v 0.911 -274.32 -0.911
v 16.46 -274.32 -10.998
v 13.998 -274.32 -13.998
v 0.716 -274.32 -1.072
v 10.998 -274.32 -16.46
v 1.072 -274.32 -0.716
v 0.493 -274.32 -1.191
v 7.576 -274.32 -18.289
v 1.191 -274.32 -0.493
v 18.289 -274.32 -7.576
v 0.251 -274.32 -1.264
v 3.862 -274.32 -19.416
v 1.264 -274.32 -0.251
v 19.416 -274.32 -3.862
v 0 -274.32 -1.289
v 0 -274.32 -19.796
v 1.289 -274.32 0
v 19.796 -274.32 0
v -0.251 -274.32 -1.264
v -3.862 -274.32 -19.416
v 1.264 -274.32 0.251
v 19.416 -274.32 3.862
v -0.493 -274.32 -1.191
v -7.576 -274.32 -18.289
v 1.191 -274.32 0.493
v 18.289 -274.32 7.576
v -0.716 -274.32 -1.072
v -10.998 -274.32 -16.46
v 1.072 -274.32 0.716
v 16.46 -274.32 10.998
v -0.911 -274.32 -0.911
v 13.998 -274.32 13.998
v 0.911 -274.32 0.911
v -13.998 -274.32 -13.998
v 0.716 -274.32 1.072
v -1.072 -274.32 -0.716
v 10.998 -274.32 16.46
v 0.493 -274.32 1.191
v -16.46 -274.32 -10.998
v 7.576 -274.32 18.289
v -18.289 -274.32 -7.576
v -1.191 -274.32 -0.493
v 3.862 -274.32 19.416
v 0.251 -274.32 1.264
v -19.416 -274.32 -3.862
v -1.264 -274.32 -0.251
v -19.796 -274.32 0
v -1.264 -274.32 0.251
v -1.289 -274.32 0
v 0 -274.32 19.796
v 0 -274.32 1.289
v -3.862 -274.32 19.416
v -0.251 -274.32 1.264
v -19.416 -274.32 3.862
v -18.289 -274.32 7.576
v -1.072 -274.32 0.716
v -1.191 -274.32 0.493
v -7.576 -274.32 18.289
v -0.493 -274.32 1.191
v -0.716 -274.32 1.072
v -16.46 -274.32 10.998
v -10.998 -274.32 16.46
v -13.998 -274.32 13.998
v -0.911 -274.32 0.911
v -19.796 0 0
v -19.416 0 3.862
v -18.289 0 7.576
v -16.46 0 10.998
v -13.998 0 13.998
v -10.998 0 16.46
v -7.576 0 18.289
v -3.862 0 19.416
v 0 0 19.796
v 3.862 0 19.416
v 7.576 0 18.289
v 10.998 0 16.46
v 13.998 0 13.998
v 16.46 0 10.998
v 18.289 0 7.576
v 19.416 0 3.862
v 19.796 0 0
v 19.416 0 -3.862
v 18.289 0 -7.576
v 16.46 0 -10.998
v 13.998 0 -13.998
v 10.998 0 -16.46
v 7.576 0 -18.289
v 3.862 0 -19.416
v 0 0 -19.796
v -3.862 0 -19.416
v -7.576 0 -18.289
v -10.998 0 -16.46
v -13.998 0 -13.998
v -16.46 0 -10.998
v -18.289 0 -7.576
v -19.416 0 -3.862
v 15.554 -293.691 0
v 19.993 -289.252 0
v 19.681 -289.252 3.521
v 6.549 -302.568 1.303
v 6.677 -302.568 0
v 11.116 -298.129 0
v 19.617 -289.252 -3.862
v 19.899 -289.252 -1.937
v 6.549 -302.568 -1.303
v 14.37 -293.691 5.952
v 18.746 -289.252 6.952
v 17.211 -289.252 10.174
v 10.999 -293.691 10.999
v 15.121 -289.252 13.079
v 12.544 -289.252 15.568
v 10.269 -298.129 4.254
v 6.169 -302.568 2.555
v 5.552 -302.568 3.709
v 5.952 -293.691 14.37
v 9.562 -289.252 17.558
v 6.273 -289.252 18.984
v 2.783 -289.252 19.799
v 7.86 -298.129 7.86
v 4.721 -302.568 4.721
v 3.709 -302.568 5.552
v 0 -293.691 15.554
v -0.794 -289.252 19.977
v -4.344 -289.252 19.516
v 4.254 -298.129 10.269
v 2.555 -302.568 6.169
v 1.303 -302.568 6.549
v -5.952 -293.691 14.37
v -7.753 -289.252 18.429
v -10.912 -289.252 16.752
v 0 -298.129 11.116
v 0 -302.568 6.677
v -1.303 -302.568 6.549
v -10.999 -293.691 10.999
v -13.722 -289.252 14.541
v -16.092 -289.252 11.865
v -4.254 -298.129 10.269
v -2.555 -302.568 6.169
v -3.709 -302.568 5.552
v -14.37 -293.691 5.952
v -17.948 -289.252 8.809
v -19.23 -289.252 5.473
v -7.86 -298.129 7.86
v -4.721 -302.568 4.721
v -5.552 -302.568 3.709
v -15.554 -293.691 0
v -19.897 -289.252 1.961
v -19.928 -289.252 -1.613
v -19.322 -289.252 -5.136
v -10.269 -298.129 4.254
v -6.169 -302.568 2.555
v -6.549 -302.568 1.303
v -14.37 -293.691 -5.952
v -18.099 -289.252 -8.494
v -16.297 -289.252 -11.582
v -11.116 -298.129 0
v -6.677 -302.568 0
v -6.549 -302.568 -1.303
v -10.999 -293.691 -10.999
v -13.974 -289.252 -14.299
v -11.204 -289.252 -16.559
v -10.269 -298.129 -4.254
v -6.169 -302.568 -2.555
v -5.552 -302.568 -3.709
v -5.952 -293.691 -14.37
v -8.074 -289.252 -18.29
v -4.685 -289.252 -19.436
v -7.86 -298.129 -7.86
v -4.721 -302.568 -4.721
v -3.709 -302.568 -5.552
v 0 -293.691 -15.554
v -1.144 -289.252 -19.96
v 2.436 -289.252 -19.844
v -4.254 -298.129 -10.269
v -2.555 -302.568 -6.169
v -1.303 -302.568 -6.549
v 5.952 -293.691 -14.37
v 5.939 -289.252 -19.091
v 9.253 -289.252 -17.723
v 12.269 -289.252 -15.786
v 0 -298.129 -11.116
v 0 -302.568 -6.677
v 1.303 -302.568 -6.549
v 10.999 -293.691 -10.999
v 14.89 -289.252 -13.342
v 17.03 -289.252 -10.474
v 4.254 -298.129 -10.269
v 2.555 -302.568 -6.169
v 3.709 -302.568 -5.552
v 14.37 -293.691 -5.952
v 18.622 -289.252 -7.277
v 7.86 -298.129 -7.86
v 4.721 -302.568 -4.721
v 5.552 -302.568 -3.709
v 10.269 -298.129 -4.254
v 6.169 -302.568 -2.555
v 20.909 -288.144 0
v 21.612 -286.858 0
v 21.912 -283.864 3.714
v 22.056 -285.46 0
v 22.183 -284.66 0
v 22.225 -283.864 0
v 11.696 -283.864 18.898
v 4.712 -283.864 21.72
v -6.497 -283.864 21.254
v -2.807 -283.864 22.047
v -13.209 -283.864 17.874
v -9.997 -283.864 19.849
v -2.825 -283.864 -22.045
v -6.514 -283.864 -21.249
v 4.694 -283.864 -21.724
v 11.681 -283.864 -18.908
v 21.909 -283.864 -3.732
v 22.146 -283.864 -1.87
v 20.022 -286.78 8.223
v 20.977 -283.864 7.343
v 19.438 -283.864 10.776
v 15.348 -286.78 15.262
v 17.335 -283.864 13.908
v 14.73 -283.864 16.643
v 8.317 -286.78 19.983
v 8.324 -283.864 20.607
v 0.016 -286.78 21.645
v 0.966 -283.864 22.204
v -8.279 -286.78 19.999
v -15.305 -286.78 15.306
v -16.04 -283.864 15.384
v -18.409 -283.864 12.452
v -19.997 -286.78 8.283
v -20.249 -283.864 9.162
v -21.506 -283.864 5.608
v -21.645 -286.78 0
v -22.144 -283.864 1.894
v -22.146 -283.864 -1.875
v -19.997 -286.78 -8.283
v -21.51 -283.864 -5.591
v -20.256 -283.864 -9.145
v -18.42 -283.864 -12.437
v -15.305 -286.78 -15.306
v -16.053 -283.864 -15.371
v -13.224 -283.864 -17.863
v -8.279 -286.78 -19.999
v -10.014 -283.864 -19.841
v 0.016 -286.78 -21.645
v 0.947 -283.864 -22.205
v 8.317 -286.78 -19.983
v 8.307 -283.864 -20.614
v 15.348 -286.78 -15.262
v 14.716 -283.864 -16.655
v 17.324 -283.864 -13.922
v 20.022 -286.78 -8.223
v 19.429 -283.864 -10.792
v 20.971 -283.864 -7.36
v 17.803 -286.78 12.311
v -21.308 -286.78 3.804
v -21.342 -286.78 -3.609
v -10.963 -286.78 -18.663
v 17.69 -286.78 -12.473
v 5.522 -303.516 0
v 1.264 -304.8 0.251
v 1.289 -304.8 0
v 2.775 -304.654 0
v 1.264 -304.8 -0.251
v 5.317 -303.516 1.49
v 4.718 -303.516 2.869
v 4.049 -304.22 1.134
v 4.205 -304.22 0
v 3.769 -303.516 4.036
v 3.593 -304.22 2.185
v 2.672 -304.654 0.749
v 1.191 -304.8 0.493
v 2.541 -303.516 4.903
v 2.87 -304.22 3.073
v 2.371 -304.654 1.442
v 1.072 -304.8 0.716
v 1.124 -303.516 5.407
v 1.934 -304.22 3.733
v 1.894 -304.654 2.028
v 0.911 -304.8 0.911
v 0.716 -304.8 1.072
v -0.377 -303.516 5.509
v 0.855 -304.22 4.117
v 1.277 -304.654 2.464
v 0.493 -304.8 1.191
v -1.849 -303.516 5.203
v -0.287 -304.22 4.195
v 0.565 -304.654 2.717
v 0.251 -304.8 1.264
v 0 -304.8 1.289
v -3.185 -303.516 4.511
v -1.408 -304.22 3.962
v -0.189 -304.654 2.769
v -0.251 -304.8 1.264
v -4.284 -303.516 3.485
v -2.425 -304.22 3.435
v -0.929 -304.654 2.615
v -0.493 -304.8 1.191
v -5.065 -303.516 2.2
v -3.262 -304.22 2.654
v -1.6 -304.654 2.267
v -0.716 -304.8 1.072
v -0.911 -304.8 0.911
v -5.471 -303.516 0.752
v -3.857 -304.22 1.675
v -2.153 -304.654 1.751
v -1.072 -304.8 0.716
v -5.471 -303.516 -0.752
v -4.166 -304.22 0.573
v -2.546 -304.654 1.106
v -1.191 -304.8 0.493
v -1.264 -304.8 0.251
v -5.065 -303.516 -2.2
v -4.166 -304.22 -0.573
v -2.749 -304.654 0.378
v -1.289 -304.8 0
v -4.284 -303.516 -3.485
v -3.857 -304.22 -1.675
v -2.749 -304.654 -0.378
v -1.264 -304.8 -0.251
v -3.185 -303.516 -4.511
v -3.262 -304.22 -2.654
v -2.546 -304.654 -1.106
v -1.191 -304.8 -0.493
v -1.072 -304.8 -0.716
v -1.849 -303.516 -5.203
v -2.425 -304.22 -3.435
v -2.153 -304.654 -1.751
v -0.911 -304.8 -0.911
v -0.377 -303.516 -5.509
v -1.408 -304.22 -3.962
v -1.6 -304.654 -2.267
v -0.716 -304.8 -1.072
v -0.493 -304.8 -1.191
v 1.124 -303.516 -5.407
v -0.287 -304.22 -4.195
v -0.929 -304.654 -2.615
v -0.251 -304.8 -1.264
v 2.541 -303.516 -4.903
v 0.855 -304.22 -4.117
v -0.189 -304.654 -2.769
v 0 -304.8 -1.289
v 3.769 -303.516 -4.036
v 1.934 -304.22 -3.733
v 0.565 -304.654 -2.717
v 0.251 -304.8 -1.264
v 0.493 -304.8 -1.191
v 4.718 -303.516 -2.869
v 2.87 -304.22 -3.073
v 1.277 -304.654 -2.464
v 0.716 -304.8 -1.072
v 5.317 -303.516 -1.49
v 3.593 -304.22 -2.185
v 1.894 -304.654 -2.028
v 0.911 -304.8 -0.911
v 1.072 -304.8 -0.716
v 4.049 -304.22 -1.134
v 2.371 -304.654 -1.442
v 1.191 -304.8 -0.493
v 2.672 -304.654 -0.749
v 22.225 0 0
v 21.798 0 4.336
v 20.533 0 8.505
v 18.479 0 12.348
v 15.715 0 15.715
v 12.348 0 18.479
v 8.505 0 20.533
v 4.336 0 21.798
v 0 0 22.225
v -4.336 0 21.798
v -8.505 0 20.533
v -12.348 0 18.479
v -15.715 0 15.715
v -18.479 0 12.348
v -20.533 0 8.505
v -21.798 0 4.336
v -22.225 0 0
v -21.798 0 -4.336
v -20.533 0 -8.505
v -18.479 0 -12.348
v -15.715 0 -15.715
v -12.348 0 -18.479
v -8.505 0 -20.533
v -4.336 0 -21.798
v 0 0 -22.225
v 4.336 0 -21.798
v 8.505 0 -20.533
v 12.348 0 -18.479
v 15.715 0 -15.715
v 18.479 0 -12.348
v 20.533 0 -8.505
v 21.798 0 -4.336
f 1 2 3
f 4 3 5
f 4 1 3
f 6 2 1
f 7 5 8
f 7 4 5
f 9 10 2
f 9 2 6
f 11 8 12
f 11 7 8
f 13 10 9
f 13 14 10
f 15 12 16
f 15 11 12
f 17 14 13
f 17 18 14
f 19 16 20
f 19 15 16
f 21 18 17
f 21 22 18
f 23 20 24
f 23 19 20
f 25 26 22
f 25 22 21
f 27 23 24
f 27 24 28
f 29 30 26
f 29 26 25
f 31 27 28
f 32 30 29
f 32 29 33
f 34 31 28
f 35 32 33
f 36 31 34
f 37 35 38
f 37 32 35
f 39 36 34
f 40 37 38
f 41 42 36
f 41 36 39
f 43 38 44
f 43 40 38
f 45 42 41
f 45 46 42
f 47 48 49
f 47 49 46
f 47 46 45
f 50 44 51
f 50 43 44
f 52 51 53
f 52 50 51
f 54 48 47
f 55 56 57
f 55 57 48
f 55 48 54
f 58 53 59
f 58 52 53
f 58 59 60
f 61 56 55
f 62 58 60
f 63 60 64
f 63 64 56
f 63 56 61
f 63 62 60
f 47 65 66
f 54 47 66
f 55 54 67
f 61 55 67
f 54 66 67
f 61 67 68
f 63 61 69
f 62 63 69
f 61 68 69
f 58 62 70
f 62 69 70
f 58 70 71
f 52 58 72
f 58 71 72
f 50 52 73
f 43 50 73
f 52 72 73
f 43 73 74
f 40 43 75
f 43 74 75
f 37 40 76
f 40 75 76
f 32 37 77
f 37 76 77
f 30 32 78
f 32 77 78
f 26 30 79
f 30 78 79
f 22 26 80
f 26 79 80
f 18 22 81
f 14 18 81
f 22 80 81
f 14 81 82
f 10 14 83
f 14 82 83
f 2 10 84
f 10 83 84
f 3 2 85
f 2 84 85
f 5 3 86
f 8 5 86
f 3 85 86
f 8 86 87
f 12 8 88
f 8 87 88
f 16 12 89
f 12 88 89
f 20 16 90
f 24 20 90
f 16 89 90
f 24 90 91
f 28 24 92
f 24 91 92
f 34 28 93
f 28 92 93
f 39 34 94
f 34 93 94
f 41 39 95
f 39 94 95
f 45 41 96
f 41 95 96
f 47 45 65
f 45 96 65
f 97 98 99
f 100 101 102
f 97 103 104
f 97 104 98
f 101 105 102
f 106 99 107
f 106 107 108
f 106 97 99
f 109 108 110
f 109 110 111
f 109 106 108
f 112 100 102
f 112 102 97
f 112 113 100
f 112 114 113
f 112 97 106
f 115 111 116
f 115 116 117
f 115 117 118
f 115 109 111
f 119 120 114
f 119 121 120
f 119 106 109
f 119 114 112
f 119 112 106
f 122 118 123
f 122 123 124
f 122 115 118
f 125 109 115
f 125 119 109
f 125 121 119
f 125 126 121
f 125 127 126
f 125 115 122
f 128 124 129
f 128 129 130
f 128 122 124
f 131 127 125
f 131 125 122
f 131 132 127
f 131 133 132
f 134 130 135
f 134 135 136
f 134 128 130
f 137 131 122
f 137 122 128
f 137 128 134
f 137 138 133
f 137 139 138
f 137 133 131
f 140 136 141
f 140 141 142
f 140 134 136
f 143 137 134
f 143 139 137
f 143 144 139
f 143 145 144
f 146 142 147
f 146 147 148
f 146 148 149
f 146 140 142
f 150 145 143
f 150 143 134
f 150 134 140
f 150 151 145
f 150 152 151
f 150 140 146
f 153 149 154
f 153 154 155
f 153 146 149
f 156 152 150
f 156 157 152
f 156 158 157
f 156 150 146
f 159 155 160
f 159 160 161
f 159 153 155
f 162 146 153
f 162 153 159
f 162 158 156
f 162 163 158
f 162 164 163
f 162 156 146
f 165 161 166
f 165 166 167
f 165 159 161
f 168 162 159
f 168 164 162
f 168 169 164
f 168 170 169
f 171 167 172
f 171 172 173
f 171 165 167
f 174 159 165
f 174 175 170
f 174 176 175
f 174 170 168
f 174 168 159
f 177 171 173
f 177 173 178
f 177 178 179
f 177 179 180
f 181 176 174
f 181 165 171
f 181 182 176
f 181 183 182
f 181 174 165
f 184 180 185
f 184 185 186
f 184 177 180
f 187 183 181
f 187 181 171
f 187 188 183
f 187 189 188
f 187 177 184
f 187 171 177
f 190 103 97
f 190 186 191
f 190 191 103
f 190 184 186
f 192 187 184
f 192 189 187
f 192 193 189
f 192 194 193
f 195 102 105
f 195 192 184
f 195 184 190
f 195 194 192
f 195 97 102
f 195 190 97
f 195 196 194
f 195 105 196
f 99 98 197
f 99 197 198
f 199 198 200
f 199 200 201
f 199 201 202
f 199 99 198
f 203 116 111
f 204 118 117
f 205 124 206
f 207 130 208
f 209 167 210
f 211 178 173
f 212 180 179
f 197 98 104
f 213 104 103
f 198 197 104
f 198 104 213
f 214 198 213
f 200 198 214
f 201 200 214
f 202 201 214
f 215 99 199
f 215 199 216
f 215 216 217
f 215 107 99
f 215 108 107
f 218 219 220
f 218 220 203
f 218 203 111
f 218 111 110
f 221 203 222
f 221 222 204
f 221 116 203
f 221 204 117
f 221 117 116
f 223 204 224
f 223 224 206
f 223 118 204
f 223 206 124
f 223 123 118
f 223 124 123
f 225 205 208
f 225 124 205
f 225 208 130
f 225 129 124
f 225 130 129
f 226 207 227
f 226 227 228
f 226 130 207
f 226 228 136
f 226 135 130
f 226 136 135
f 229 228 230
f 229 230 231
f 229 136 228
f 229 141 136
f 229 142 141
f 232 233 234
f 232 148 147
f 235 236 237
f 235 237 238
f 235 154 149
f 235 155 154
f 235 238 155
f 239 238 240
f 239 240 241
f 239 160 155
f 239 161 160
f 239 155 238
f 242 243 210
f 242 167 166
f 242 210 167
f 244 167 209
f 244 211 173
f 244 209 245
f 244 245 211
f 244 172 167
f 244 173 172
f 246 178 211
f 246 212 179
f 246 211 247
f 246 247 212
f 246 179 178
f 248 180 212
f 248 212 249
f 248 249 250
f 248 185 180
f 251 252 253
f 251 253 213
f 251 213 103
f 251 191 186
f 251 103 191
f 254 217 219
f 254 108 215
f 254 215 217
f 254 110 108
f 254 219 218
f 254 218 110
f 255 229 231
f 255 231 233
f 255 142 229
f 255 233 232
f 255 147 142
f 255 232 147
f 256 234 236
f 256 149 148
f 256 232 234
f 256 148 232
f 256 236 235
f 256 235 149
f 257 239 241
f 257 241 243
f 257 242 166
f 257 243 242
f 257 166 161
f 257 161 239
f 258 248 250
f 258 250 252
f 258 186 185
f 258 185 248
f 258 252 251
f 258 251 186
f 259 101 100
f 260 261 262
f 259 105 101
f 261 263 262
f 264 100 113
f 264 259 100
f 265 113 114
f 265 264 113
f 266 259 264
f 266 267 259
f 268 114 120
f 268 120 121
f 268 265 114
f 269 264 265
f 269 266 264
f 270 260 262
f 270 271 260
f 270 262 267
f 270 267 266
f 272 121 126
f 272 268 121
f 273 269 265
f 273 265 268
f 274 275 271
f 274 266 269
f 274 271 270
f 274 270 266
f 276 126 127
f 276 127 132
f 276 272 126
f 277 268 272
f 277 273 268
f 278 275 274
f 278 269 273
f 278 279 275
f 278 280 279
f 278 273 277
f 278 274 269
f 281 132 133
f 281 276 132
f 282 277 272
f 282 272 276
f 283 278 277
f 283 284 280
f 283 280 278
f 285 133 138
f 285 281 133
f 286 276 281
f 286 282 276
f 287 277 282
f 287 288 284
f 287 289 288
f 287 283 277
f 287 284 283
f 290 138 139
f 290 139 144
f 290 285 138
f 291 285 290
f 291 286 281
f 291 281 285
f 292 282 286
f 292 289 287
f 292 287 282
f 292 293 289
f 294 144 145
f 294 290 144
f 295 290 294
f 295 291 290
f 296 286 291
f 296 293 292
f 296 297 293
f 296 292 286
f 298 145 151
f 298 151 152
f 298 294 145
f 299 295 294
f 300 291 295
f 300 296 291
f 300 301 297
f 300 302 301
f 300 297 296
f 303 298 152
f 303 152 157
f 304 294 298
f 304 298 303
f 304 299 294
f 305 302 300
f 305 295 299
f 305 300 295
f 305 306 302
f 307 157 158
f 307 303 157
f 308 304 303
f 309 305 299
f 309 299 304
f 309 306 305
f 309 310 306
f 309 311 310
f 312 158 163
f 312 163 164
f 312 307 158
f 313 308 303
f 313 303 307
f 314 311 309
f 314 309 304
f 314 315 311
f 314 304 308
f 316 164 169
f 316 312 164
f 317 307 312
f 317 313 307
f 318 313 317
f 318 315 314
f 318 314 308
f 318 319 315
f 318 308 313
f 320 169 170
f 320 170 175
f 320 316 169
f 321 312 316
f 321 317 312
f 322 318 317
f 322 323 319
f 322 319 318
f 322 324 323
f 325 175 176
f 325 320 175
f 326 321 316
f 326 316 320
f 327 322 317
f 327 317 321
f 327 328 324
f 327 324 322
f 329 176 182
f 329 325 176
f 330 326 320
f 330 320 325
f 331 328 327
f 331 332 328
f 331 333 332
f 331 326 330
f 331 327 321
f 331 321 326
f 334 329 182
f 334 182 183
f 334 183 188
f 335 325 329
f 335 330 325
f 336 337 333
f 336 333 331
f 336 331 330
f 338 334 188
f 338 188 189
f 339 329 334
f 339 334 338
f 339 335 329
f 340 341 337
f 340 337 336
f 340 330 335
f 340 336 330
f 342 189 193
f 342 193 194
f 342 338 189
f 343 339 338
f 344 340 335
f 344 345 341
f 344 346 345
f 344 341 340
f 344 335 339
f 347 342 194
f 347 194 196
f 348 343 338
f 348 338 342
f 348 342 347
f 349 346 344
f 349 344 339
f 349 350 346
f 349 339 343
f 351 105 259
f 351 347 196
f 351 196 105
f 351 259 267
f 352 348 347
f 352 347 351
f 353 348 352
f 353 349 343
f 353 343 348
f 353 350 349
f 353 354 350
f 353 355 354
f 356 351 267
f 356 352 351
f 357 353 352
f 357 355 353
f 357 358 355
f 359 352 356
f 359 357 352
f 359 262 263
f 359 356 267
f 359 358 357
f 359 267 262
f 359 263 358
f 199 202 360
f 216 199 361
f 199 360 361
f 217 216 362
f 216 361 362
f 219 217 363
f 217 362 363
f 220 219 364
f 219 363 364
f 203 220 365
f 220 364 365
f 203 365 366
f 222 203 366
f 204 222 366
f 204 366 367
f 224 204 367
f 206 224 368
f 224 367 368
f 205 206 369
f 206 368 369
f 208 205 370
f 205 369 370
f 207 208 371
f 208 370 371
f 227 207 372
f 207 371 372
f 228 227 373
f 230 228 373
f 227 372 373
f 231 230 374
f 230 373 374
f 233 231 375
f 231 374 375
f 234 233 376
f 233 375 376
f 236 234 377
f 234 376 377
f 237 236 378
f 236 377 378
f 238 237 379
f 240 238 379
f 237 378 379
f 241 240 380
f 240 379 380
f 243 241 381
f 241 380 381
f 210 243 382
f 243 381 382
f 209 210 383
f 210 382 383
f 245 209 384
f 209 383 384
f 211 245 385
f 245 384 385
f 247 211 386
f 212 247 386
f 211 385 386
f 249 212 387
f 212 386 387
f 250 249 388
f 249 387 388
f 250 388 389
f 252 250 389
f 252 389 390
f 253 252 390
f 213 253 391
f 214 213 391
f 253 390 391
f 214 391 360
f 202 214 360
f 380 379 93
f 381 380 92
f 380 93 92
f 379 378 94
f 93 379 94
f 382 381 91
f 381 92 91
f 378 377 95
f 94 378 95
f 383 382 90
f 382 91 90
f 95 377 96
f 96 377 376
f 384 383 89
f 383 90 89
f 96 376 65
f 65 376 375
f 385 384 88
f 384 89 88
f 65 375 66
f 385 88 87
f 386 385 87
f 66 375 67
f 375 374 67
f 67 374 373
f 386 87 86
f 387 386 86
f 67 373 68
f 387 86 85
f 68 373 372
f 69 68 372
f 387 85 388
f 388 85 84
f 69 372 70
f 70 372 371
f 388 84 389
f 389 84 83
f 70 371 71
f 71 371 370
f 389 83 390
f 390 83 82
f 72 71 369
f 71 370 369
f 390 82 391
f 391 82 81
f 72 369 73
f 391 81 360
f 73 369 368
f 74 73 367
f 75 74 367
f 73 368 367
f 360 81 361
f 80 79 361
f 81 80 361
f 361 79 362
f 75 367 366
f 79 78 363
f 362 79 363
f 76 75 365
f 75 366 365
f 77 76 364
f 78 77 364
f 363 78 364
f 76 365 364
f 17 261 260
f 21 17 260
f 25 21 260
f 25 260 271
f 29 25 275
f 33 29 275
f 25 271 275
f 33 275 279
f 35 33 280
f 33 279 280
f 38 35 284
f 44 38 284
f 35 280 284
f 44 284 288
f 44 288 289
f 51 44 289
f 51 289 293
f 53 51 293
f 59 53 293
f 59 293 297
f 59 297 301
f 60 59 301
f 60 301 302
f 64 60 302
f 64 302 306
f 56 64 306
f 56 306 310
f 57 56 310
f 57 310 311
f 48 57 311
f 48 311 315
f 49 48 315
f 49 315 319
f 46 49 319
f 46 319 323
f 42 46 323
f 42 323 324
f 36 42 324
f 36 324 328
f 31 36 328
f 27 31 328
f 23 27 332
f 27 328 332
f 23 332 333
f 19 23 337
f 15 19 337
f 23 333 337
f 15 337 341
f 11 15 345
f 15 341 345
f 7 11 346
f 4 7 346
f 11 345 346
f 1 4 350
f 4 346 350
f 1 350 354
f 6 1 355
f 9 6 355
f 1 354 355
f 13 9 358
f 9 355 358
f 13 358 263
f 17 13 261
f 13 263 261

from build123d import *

# Parameters (mm, degrees)
F0_R     = 22.225
F1_DEPTH = 304.8
F2_SIZE  = 17.78
F3_R     = 7.62
F4_R     = 7.62
F6_R     = 19.7961315642
F7_DEPTH = 274.32
F8_R     = 1.2886926547
F9_DEPTH = 304.8


with BuildPart() as f1:
    # F0 (on Front) → F1 (new body)
    with BuildSketch(Plane.XZ):
        Circle(F0_R)
    extrude(amount=F1_DEPTH)

    # F2
    f2_edges = [f1.edges().sort_by_distance(p)[0] for p in [
        (-22.225, -304.8, 0),
    ]]
    chamfer(f2_edges, length=F2_SIZE)

    # F3
    f3_edges = [f1.edges().sort_by_distance(p)[0] for p in [
        (-4.445, -304.8, 0),
    ]]
    fillet(f3_edges, radius=F3_R)

    # F4
    f4_edges = [f1.edges().sort_by_distance(p)[0] for p in [
        (-22.225, -287.02, 0),
    ]]
    fillet(f4_edges, radius=F4_R)

    # F6 (on face) → F7 (cut)
    with BuildSketch(Plane(origin=(0, 0, 0), x_dir=(-1, 0, 0), z_dir=(0, 1, 0))):
        Circle(F6_R)
    extrude(amount=-F7_DEPTH, mode=Mode.SUBTRACT)

    # F8 (on face) → F9 (cut)
    with BuildSketch(Plane.XZ.offset(304.8)):
        Circle(F8_R)
    extrude(amount=-F9_DEPTH, mode=Mode.SUBTRACT)


solid = f1.part
